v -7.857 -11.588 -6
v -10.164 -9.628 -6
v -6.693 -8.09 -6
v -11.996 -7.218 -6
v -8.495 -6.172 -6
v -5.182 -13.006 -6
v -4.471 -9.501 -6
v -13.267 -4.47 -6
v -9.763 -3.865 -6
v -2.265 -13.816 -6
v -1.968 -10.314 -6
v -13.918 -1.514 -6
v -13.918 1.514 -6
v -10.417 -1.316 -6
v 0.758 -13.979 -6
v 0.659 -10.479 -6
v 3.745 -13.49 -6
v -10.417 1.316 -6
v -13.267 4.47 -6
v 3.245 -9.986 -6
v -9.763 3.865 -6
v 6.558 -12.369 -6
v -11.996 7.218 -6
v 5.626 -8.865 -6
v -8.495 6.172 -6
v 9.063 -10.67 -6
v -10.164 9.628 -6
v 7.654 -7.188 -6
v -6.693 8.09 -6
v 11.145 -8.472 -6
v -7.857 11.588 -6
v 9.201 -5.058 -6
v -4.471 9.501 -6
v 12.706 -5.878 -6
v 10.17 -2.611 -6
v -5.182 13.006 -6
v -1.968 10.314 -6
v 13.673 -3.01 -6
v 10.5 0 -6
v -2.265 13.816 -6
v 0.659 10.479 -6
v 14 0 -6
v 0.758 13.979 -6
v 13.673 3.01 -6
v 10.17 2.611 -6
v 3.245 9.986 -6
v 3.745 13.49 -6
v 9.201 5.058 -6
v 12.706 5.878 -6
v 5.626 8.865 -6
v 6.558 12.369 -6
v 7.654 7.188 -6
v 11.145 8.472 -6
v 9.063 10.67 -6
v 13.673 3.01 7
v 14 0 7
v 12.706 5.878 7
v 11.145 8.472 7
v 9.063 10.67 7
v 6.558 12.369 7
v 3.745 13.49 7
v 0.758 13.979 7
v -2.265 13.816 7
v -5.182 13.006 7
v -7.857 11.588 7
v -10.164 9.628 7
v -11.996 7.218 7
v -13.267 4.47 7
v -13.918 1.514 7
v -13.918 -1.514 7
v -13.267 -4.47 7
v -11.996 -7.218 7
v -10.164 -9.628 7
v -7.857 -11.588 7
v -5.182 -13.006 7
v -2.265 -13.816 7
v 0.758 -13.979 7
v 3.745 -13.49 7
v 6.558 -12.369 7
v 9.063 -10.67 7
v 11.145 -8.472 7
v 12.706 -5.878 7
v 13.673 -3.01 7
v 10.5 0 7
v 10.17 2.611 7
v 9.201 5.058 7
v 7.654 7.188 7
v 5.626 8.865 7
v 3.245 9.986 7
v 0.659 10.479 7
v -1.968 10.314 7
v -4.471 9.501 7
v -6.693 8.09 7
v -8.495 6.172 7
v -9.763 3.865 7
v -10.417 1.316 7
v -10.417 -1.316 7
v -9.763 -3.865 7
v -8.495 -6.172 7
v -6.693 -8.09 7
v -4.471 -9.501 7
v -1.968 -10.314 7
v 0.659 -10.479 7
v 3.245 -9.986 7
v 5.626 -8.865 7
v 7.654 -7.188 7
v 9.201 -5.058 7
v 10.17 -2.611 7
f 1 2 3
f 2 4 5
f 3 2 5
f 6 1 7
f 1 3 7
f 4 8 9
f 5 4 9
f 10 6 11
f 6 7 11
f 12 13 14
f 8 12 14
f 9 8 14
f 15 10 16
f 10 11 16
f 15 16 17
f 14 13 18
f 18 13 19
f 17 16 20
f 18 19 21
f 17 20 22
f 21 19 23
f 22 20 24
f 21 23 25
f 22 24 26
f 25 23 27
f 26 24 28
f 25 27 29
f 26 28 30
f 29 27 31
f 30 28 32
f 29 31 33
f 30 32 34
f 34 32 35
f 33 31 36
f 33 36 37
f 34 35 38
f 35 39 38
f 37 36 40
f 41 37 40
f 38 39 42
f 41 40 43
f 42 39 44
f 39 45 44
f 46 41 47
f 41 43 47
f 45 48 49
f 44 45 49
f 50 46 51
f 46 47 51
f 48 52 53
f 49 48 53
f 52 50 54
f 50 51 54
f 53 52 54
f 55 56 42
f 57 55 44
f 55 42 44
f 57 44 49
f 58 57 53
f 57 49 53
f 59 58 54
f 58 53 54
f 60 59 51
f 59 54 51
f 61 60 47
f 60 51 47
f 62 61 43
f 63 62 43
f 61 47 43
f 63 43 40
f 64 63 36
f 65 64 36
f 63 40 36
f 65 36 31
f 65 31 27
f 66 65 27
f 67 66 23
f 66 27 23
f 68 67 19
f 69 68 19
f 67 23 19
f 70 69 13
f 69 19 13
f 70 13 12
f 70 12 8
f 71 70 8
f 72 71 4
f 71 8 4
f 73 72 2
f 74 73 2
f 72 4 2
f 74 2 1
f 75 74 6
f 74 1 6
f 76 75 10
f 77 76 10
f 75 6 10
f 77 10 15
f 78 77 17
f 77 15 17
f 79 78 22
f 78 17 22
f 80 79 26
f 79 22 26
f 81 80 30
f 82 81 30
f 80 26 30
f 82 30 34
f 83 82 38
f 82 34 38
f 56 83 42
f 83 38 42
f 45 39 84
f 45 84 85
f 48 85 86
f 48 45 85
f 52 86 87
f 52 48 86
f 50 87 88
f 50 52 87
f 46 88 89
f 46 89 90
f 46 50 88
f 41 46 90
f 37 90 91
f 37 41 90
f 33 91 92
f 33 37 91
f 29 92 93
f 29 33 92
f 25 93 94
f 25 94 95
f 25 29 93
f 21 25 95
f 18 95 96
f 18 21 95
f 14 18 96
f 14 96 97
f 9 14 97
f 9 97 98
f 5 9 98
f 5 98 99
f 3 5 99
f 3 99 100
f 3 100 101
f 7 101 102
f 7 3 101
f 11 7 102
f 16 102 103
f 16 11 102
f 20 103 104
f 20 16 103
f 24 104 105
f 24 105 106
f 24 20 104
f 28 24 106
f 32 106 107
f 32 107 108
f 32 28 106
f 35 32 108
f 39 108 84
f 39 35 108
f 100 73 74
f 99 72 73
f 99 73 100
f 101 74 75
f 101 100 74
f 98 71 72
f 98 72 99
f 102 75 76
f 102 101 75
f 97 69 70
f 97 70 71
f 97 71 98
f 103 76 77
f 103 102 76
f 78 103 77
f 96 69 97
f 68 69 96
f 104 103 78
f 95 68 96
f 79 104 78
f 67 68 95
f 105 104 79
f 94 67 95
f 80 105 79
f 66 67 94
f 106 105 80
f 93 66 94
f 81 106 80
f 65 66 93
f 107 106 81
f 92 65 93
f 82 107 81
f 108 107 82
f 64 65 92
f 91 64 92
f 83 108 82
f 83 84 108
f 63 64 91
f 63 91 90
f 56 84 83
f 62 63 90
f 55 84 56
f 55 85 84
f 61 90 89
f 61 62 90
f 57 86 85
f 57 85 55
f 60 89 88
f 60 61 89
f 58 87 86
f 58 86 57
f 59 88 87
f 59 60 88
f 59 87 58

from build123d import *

# Parameters (mm, degrees)
CYLINDER014_R     = 10.5
CYLINDER014_DEPTH = 13
CYLINDER013_R     = 14
CYLINDER013_DEPTH = 13


with BuildPart() as cylinder014:
    # Cylinder014 → Cylinder014 (new body)
    with BuildSketch(Plane.XY.offset(-6)):
        Circle(CYLINDER014_R)
    extrude(amount=CYLINDER014_DEPTH)


with BuildPart() as cut086:
    # Cylinder013 → Cylinder013 (new body)
    with BuildSketch(Plane.XY.offset(-6)):
        Circle(CYLINDER013_R)
    extrude(amount=CYLINDER013_DEPTH)

    # Cut086: cut Cylinder014
    add(cylinder014.part, mode=Mode.SUBTRACT)


solid = cut086.part
